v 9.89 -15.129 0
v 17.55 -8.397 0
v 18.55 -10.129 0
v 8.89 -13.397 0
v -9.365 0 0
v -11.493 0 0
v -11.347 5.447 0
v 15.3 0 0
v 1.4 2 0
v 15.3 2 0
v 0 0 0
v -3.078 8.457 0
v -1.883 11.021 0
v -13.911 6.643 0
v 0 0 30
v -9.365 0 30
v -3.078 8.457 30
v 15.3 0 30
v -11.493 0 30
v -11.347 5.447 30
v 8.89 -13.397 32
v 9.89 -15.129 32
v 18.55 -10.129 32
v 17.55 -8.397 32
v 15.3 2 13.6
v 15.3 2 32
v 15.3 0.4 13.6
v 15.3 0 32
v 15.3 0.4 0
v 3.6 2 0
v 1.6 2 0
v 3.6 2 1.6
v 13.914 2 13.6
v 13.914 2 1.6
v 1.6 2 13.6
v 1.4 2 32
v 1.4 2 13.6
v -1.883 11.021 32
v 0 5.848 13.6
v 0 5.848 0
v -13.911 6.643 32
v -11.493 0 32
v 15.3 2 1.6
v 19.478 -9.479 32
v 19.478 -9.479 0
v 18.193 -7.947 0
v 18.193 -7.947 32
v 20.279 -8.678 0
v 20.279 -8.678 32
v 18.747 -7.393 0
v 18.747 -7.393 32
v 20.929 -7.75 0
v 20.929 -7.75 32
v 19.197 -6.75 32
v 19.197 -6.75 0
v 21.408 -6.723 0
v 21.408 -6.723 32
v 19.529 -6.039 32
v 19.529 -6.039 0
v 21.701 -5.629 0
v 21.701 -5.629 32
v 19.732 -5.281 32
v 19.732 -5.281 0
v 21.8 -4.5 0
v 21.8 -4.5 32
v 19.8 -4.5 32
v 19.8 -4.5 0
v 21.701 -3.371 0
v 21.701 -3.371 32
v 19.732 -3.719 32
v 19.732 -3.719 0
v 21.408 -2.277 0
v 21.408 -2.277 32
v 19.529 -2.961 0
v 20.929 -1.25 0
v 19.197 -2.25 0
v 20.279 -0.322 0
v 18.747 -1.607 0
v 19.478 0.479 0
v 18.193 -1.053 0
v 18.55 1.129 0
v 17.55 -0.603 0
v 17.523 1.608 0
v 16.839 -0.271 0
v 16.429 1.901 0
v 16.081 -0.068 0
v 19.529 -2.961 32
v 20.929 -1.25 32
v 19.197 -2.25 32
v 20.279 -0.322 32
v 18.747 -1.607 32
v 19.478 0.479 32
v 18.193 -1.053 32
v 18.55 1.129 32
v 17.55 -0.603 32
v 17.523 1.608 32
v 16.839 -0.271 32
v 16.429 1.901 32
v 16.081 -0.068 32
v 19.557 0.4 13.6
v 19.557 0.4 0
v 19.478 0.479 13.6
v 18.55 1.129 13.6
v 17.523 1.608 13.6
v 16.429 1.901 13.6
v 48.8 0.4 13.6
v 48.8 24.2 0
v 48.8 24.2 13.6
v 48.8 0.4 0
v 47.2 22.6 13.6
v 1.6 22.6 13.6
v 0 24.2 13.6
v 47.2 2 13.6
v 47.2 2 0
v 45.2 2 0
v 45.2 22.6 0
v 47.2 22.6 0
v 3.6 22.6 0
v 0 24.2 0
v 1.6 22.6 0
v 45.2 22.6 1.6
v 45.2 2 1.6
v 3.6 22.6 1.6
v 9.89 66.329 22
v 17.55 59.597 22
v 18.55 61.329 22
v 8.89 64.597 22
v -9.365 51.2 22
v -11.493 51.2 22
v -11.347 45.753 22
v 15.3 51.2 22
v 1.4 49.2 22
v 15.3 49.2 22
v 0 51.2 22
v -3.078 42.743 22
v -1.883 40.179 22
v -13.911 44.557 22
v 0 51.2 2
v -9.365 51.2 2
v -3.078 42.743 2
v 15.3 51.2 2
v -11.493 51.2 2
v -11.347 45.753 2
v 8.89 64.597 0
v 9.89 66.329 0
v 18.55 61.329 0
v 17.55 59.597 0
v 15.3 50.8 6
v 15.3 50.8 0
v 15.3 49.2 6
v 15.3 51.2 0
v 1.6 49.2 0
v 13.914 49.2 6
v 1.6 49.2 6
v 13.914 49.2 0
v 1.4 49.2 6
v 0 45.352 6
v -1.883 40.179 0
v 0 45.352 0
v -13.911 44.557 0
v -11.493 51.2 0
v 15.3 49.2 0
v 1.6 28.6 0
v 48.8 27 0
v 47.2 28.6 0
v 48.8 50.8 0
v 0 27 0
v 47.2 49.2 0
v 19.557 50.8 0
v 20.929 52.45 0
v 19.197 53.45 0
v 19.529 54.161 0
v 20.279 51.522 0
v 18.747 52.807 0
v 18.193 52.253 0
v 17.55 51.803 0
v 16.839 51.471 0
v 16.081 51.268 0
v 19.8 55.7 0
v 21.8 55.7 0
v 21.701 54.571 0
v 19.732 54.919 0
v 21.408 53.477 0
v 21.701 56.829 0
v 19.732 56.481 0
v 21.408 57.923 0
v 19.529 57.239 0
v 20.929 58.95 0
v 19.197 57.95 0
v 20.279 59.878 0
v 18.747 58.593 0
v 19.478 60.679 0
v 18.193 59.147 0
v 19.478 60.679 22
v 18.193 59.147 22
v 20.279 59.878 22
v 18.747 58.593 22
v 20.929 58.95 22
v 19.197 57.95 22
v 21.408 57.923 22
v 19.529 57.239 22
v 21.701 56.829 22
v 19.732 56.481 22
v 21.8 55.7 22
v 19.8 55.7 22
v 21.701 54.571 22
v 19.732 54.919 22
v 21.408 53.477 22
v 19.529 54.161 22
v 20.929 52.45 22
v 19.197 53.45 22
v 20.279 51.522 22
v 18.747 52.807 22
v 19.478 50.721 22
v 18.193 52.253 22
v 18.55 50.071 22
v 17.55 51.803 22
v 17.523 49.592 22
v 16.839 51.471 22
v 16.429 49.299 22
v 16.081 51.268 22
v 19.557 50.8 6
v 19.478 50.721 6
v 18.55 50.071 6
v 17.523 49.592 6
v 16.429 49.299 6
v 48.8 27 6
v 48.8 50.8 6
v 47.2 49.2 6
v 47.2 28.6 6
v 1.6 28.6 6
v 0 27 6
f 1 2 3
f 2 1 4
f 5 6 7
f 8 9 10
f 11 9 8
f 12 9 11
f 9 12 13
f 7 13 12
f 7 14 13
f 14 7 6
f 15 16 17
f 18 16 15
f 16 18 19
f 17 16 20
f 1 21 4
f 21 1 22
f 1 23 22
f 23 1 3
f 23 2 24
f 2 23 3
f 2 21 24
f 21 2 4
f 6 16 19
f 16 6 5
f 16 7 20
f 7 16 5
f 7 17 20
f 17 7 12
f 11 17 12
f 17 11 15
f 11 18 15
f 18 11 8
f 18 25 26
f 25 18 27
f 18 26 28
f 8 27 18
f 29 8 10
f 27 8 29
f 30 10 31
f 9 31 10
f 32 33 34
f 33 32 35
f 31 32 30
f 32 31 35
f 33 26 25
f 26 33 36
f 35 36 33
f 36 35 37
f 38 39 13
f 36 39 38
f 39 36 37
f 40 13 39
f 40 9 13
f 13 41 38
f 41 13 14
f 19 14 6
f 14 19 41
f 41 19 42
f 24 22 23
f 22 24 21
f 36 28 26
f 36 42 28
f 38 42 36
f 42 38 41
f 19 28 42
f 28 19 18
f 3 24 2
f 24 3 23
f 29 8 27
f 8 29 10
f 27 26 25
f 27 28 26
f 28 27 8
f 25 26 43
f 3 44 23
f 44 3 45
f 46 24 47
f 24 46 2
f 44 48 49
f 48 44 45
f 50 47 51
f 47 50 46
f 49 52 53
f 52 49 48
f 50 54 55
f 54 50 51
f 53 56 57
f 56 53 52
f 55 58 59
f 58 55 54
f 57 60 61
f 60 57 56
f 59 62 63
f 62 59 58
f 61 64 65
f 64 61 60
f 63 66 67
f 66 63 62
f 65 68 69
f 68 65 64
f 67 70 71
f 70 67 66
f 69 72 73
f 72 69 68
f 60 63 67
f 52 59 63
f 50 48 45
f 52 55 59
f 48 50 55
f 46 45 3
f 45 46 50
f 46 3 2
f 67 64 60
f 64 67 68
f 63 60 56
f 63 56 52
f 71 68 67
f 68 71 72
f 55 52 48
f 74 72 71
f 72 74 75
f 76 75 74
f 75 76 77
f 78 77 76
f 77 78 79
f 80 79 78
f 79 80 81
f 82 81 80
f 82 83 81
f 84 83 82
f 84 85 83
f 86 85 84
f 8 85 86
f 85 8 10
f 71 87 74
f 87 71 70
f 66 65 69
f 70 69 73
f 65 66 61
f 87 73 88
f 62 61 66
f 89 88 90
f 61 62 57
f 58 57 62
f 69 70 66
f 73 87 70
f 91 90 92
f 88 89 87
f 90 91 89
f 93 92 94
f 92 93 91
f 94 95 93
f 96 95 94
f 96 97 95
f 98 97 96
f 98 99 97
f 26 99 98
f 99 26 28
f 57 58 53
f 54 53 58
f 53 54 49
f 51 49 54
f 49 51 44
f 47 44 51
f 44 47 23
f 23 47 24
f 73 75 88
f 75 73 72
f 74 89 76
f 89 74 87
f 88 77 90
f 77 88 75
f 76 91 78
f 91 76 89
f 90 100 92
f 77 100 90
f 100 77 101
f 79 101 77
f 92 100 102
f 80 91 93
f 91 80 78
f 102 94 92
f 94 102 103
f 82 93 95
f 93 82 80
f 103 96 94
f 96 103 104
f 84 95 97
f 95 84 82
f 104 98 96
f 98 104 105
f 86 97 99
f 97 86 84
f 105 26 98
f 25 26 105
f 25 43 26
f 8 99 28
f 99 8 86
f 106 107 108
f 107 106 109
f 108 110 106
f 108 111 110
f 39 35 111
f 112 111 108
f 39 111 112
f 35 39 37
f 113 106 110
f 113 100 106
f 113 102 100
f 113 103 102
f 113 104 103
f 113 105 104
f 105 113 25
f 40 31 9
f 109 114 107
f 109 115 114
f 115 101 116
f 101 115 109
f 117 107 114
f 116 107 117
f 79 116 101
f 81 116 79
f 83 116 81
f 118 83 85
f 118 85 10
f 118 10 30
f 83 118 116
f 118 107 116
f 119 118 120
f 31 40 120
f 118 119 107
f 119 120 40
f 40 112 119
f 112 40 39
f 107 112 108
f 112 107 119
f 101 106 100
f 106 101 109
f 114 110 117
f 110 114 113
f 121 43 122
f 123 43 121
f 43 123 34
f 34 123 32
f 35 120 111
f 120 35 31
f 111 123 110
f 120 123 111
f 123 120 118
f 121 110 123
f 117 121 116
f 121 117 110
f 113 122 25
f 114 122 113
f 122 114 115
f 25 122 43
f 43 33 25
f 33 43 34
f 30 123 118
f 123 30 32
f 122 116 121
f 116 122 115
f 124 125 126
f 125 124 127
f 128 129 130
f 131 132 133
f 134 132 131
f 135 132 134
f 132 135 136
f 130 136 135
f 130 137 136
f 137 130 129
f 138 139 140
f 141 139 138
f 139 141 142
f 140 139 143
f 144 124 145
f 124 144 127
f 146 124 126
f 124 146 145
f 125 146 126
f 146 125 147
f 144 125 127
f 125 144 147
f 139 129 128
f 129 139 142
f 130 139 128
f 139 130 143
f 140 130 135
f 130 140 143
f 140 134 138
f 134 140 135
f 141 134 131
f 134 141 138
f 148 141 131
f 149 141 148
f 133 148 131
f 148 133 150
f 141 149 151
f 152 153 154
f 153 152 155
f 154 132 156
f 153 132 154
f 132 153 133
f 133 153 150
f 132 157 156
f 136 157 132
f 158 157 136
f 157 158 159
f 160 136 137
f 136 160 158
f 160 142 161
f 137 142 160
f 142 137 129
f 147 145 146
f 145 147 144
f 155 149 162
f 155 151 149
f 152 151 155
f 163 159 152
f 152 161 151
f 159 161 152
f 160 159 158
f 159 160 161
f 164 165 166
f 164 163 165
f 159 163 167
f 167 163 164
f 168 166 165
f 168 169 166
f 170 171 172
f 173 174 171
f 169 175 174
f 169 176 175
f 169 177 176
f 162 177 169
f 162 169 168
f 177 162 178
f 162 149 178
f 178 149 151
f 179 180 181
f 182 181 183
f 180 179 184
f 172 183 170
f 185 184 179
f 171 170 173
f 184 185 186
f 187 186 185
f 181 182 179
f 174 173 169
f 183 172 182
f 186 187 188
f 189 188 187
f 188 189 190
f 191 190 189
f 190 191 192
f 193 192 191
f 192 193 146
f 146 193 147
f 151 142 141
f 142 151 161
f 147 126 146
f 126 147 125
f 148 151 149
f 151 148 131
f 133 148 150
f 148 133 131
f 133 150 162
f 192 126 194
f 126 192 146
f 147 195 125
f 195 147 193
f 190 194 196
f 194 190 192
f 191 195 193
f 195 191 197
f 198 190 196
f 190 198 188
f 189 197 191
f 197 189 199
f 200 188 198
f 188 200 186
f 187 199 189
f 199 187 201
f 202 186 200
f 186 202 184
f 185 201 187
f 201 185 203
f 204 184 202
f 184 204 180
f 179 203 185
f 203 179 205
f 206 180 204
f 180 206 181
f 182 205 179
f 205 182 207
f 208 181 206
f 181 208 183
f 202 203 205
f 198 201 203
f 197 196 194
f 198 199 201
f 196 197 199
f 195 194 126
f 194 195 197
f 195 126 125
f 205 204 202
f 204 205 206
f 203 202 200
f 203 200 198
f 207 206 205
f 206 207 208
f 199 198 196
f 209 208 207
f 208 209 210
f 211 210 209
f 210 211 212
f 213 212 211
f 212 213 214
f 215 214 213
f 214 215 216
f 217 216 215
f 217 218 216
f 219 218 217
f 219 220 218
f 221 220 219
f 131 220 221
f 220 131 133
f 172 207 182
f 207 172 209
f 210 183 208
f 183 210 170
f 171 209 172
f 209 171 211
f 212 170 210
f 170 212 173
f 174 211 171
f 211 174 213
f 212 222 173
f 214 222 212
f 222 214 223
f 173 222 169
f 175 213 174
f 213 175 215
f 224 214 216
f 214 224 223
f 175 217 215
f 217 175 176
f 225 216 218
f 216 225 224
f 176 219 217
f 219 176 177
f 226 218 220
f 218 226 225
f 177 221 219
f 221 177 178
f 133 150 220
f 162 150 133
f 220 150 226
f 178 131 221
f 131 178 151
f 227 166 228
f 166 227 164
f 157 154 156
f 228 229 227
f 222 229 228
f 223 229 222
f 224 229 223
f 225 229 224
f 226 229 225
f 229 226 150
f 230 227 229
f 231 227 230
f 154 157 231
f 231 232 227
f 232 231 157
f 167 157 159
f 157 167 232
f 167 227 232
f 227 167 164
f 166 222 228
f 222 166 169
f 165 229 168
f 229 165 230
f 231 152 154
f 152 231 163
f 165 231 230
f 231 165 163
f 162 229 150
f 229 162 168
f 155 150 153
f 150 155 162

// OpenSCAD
// depth behind clip: 6
// clip deep 8
// depth in front of clip: 9
// from clip to edge 19
// edge width 9

part="both"; // ["upper","lower","both"]

// clip size
clw=8.8;

// clip depth
cld=9;

// from clip to front (total)
cltf=19.8;

// clip angle
a=20;

// outer angle
a2=10;

// thickness
clt=2;

// height
clh=2;

// front diameter
dd=9;

// temperature sensor size, width
tsw=45.6;

// temperature sensor size, depth
tsd=20.6;

// temperature sensor "upper" clip to bottom distance
tsch=61;

// basket/ring thickness
bt=1.6; // basket thickness



cltfd=cltf-dd/2;

module clip_profile(top)
{
   rotate(a2)
      translate([0,dd/2])
      square([10,clt]);
   
   rotate(-a)
   {
      mirror([0,1])
         translate([0,dd/2])
         difference()
      {
         intersection()
         {
            square([100,100]);
            union()
            {
               square([cltfd+clw+clt,clt]);
               translate([cltfd-clt*0,0])
                  rotate(-a)
                  translate([-clt,0])
                  square([clw+clt*2,cld+clt]);
            }
         }
         if (!top)
            translate([cltfd,0])
               rotate(-a)
               translate([0,-1])
               square([clw,cld+1]);
      }
   }
}


module door_clip(clh,top=true)
   rotate([0,0,180])
   translate([-cltfd,dd/2,0])
   rotate([0,0,a])
{
   linear_extrude(height=clh)
      clip_profile(0);

   if (top)
   translate([0,0,clh])
   linear_extrude(height=clt)
      clip_profile(1);
   
   rotate([0,0,90+a2])
      rotate_extrude(angle=180-a-a2,$fn=36)
   {
      translate([dd/2,0])
         square([clt,clh+(top?clt:0)]);
   }

}

module basket(nobottom,bh=5)
{
   translate([0,0,nobottom?0:bt])
   difference()
   {
      translate([0,0,nobottom?0:-bt])
         cube([tsw+bt*2,tsd+bt*2,nobottom?bh:bh+bt]);
      translate([bt,bt,nobottom?-0.5:0])
         cube([tsw,tsd,bh+1]);
      translate([bt,bt,-bt-1])
         cube([2,tsd,bh+2]);
      translate([bt+tsw-2,bt,-bt-1])
         cube([2,tsd,bh+2]);
   }
}

module lower_clip()
{
   bclh=30;
   door_clip(clh=bclh,top=1);
   translate([0,-bt+clt,0])
   basket(0,bh=12);
}

module upper_clip()
   translate([0,0,-6])
{
   bclh=20;
   translate([0,0,-(bclh-4)])
   door_clip(clh=bclh,top=1);
   translate([0,-bt+clt,0])
   basket(1,bh=6);
}

if (part!="upper") lower_clip();
if (part!="lower")
   translate([0,tsd*2+10,0]) rotate([0,180,180]) upper_clip();
